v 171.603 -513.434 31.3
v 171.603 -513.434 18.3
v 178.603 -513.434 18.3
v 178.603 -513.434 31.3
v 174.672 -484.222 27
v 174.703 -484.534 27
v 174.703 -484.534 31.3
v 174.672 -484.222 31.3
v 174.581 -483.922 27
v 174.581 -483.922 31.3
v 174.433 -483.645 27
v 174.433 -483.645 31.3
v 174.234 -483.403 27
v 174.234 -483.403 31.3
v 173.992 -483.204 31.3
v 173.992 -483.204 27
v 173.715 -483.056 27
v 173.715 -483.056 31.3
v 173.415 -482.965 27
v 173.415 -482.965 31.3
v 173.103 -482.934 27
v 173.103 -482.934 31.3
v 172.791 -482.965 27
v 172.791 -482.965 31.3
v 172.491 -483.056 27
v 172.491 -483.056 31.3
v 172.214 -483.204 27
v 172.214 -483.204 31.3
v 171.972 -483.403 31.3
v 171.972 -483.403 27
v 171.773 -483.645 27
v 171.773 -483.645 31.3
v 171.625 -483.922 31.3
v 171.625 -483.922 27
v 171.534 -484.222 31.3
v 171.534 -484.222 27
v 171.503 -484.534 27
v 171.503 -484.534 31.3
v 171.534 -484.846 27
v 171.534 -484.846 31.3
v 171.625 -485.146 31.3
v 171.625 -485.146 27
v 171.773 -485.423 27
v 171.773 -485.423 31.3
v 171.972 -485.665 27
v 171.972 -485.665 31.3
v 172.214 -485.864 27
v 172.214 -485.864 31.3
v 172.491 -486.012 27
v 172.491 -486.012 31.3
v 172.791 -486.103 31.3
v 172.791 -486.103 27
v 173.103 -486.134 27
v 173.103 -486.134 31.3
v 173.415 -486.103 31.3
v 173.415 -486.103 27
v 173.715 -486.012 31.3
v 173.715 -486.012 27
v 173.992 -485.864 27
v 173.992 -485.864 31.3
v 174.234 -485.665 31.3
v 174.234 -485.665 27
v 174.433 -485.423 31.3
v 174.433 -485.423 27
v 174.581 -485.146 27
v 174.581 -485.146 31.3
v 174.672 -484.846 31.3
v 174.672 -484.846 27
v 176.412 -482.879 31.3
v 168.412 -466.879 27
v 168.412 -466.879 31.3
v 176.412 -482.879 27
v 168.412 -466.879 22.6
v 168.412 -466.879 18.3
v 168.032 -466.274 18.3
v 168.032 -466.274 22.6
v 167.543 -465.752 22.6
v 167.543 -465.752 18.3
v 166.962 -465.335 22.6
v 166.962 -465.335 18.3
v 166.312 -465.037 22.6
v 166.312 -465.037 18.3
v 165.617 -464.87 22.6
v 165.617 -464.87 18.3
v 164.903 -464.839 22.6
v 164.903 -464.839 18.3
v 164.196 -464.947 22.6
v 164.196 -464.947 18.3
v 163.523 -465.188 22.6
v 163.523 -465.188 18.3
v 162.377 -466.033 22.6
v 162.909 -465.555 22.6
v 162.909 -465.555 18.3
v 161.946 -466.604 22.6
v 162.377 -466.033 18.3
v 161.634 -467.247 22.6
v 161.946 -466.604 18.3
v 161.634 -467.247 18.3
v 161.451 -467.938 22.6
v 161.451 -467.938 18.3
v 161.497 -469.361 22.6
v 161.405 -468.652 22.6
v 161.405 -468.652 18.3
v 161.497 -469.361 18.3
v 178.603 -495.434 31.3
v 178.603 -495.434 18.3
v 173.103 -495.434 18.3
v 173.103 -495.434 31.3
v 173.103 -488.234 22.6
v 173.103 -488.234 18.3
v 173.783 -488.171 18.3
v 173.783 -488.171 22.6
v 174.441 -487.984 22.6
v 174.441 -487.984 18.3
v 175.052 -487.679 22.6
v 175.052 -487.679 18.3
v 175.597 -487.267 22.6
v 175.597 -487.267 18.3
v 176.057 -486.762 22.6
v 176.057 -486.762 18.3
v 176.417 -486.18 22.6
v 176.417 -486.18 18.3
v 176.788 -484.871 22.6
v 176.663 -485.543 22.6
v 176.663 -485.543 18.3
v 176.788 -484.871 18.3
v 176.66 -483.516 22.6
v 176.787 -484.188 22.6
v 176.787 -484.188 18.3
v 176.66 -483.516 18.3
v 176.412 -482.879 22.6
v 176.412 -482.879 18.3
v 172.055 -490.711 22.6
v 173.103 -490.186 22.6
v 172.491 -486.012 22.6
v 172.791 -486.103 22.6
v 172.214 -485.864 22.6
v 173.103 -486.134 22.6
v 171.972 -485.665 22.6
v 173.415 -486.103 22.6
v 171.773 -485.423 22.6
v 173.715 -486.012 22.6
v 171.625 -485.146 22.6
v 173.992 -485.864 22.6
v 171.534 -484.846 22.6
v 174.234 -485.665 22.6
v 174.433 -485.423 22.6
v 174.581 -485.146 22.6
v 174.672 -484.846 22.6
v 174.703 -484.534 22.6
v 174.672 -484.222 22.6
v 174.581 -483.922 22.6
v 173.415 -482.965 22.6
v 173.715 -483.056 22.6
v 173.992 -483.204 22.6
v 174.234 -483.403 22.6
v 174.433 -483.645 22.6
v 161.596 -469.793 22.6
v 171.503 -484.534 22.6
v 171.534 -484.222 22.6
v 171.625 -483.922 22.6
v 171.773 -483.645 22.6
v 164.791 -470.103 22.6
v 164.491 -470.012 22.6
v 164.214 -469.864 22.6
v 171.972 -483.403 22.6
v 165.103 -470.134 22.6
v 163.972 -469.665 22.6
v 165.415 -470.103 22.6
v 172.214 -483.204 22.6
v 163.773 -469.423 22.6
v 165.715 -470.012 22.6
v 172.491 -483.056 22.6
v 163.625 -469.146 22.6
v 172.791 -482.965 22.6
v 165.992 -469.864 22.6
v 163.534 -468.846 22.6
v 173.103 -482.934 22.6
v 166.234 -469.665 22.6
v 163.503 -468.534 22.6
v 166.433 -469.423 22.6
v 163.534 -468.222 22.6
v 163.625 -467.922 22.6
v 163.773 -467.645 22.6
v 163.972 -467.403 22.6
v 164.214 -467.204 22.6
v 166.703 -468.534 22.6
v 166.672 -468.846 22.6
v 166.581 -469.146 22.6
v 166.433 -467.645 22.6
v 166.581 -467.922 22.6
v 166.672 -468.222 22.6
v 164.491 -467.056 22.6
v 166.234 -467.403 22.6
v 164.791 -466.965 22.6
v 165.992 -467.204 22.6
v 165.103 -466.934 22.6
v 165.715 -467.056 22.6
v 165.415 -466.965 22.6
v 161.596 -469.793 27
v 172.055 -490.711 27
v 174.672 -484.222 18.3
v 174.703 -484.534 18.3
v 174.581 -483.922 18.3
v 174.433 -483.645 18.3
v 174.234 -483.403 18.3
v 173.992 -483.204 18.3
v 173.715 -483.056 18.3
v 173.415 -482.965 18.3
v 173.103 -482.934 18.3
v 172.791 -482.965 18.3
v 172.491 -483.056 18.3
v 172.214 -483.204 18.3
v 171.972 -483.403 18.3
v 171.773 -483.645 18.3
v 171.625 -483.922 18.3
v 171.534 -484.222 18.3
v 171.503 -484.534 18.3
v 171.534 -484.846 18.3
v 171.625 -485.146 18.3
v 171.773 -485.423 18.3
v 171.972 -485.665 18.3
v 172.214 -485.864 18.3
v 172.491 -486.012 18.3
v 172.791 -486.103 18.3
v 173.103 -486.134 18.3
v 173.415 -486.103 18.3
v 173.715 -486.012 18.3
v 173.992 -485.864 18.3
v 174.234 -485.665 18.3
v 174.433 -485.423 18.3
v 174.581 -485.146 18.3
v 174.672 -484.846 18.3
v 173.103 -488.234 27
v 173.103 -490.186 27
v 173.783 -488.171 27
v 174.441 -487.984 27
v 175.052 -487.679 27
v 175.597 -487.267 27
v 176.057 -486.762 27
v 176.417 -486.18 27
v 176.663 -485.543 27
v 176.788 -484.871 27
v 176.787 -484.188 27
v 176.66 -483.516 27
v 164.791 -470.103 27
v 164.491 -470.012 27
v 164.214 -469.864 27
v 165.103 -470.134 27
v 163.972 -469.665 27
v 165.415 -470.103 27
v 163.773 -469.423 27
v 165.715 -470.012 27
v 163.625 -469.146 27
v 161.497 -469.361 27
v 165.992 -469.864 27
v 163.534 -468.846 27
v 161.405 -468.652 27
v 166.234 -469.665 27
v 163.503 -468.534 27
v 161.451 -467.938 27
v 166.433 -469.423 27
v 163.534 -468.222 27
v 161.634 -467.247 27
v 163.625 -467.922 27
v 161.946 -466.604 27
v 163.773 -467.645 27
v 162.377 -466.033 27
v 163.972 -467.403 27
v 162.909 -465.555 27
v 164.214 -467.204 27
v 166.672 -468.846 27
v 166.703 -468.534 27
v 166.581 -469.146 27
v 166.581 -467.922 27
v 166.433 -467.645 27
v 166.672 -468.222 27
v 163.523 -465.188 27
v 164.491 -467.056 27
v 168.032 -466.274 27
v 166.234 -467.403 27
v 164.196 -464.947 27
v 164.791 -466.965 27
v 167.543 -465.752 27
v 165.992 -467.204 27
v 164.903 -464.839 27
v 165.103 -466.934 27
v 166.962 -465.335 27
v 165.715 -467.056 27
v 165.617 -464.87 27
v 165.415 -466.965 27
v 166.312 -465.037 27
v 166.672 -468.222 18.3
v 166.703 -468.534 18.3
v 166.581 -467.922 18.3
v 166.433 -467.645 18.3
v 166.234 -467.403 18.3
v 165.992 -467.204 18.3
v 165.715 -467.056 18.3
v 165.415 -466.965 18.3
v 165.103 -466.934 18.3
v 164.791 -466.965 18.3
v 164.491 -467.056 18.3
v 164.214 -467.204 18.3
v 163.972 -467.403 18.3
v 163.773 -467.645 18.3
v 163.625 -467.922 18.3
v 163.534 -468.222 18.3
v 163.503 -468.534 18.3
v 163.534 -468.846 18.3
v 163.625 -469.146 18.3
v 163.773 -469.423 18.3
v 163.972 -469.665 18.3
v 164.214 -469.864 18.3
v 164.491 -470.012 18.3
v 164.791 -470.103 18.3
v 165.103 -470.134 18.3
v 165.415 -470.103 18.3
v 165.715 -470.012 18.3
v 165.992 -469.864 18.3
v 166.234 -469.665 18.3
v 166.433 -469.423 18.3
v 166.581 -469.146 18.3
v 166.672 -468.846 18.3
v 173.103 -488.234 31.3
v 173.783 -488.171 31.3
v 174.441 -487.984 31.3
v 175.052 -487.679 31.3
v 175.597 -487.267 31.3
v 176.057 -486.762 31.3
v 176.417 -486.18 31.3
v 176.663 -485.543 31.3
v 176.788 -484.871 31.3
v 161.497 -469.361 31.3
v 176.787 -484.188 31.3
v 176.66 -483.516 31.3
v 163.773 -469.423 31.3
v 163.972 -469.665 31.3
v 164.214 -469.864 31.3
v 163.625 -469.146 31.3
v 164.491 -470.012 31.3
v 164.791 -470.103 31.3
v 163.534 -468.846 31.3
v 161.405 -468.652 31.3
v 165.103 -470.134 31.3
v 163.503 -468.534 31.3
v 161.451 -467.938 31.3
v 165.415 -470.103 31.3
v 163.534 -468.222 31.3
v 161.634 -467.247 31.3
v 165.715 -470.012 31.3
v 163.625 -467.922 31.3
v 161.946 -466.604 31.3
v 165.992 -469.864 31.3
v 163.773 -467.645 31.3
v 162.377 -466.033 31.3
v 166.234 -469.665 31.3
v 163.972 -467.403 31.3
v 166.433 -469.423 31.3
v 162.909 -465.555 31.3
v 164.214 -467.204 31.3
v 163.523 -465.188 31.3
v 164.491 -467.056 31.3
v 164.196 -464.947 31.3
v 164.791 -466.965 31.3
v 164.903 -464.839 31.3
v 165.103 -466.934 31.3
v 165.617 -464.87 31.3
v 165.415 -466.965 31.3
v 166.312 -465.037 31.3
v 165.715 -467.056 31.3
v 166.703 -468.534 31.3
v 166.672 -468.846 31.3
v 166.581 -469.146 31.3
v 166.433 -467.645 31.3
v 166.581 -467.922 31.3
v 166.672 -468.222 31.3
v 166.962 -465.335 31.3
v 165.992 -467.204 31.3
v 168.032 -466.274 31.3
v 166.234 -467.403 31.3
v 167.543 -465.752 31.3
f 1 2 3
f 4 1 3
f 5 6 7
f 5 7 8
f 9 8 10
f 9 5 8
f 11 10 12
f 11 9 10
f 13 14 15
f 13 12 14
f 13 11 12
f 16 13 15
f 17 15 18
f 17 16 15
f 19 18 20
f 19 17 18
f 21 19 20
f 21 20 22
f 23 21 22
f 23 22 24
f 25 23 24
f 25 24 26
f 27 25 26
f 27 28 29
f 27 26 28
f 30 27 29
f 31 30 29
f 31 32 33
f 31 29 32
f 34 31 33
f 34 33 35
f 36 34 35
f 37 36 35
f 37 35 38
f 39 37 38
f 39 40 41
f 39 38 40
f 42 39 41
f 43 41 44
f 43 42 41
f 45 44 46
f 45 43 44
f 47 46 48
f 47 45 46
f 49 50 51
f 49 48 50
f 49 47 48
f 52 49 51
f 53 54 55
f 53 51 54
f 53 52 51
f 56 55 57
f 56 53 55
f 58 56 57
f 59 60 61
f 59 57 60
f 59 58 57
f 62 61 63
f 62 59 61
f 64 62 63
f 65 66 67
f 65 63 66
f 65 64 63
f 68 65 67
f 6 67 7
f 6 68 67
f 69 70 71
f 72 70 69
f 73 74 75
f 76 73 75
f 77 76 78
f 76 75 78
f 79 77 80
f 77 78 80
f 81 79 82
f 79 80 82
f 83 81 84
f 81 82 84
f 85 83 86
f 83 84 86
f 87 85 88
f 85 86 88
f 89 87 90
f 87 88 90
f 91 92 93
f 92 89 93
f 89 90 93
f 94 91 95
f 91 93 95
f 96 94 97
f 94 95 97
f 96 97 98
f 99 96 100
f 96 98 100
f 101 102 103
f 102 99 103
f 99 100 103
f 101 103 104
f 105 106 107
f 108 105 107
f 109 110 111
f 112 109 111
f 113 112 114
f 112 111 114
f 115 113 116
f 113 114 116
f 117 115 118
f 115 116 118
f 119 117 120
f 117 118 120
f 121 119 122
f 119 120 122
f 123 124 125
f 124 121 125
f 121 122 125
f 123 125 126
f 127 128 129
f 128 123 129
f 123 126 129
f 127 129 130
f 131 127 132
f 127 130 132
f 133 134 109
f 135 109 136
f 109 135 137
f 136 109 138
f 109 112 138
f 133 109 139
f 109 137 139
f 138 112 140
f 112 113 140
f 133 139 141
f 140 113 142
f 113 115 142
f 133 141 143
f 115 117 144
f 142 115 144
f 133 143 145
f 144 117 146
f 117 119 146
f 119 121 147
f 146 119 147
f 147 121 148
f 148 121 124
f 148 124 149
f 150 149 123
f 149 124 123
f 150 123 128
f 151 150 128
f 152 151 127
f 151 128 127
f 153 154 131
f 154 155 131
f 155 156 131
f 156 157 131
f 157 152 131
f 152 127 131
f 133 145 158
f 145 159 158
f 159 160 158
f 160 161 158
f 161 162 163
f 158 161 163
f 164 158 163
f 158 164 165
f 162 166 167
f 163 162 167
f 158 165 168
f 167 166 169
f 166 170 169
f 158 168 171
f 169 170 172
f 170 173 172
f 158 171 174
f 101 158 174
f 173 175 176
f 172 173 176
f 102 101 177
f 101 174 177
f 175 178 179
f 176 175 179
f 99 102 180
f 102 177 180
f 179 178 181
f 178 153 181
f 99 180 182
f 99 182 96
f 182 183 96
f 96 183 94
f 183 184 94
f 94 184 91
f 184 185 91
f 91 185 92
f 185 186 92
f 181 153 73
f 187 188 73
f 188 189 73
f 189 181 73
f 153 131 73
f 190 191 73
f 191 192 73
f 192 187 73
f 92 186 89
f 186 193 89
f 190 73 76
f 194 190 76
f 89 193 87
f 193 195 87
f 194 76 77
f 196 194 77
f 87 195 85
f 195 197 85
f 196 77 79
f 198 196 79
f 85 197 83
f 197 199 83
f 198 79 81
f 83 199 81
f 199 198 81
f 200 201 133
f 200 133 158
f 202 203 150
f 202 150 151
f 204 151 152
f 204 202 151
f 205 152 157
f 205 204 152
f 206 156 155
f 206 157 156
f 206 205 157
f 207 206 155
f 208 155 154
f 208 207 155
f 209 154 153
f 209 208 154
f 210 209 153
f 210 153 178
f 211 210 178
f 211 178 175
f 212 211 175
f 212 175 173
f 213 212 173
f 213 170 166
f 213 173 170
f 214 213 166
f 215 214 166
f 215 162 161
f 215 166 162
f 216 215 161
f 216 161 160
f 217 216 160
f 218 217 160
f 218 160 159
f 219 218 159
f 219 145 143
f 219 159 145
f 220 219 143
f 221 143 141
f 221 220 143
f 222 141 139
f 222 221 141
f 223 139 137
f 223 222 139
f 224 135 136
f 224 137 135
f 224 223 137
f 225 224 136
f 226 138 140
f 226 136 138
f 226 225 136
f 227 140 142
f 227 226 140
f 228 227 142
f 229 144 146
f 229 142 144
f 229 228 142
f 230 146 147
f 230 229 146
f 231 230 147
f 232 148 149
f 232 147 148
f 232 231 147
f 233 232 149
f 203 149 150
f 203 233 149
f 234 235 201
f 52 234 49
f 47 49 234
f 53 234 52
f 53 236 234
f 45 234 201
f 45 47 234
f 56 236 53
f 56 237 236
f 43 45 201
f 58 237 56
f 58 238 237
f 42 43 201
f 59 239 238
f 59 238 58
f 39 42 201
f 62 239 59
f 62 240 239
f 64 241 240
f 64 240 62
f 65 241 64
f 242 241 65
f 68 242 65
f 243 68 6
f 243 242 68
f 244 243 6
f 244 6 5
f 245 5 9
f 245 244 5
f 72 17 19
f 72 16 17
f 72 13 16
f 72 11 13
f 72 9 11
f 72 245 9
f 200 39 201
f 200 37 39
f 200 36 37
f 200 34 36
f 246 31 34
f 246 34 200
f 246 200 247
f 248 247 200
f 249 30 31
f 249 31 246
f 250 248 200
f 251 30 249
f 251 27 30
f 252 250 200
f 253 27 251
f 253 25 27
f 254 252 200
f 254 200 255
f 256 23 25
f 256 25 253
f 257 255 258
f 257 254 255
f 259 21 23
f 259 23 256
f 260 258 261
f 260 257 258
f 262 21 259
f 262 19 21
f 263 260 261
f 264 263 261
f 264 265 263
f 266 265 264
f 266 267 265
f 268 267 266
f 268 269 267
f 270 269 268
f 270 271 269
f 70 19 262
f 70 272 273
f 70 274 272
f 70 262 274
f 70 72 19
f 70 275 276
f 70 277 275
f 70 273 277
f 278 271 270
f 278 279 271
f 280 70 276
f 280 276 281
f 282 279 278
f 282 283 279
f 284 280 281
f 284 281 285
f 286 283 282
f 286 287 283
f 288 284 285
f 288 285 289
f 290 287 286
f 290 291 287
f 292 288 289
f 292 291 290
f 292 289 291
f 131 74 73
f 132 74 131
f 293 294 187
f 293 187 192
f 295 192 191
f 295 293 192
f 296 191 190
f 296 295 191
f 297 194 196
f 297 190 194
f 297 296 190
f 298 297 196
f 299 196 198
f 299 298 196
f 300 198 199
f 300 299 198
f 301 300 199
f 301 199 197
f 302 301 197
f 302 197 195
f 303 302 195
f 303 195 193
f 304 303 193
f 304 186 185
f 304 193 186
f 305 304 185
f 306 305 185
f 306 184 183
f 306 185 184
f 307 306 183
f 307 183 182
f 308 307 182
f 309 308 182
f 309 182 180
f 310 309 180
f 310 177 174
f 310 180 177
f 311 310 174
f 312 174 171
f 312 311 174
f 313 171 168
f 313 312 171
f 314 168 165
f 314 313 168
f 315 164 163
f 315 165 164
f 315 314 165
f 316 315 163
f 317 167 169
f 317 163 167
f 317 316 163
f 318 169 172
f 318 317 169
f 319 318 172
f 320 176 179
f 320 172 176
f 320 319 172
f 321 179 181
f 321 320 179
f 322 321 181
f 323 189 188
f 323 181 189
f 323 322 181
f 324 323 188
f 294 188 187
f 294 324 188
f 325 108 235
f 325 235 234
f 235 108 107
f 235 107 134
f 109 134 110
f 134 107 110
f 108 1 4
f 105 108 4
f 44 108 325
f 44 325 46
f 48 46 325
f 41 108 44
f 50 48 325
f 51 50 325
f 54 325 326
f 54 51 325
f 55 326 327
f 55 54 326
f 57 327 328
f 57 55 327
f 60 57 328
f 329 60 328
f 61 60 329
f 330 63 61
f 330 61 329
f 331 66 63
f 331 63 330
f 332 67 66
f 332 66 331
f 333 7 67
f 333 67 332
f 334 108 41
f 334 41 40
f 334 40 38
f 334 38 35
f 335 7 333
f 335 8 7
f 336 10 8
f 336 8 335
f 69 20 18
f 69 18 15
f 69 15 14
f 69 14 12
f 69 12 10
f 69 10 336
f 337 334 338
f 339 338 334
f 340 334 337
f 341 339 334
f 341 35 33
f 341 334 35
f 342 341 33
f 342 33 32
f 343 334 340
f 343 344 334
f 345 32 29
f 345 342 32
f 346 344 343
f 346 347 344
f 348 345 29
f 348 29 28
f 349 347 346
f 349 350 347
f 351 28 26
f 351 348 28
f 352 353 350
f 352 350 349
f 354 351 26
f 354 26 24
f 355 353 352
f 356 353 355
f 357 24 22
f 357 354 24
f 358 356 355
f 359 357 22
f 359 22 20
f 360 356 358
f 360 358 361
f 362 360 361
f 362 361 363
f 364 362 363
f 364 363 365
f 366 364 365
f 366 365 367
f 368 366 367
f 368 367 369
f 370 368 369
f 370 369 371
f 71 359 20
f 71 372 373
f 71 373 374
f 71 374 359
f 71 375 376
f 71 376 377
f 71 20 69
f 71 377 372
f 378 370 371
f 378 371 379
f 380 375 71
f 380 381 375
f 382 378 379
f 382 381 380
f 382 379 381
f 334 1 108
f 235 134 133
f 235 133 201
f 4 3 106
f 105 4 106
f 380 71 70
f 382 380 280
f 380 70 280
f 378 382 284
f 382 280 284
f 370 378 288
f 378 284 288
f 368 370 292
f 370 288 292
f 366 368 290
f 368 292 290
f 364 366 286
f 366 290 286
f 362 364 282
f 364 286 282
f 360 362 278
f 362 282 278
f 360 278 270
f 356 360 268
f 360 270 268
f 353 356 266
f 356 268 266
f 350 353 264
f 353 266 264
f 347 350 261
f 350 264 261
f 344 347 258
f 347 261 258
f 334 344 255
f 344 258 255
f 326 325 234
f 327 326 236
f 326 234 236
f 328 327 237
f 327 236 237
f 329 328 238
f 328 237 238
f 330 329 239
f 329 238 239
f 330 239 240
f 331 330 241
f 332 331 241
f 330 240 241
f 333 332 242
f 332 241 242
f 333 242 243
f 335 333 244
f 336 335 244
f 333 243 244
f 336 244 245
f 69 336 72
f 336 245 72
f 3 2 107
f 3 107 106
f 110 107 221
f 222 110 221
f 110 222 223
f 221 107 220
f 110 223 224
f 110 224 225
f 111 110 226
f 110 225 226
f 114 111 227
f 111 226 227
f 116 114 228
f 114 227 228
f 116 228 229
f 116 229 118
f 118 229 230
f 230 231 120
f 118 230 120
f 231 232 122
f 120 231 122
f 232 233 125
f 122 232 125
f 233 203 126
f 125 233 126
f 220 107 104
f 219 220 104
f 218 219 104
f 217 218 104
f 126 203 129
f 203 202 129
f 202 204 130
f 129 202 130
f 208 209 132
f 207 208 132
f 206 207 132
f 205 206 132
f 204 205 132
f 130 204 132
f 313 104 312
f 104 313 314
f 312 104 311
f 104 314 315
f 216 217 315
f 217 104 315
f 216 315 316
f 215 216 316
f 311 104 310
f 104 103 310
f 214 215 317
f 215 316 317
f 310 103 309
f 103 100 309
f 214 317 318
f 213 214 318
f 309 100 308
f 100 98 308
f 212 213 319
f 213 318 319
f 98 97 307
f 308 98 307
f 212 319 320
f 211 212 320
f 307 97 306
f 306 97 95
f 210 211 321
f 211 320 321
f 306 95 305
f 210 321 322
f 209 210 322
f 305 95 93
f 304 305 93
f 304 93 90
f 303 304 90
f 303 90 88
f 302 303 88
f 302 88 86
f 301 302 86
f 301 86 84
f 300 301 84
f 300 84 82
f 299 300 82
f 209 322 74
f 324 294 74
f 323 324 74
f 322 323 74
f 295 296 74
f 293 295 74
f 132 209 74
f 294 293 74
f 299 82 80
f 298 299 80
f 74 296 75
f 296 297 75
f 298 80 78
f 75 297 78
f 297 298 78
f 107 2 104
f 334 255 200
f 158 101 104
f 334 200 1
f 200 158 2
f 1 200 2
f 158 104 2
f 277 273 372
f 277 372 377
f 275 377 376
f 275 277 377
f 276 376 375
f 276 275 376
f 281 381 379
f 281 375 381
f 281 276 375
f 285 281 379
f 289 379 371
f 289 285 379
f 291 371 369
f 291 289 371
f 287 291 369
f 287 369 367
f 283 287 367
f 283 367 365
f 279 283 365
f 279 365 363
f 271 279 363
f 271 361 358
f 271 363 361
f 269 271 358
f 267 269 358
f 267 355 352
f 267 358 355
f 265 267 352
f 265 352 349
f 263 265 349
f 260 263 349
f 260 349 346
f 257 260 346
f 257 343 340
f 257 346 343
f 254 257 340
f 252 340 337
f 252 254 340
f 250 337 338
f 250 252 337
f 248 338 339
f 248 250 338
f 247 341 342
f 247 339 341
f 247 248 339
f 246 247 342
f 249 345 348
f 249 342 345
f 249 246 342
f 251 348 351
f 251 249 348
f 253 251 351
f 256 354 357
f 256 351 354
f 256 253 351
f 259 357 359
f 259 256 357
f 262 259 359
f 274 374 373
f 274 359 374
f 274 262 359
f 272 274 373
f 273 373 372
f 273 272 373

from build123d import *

# Parameters (mm, degrees)
CYLINDER005_R     = 1.6
CYLINDER005_DEPTH = 30
PAD001_DEPTH      = 13
SKETCH001_W       = 28
SKETCH001_H       = 4.4
POCKET002_DEPTH   = 7.4


with BuildPart() as finger_drill_master:
    # Cylinder005 → Cylinder005 (new body)
    with BuildSketch(Plane.XY.offset(-8)):
        Circle(CYLINDER005_R)
    extrude(amount=CYLINDER005_DEPTH)


with BuildPart() as clone001:
    # Clone001 base: copy of finger-drill-master
    add(finger_drill_master.part)


with BuildPart() as clone001_1:
    # Clone001 placement: moved
    add(clone001.part.moved(Location((-5.5, 28.9, 0))))


with BuildPart() as finger_drills:
    # Clone002 base: copy of finger-drill-master
    add(finger_drill_master.part)


with BuildPart() as finger_drills_1:
    # Clone002 placement: moved
    add(finger_drills.part.moved(Location((-13.5, 44.9, 0))))

    # Fusion011: union Clone001
    add(clone001_1.part)


with BuildPart() as clone_of_left_finger:
    # Sketch007 → Pad001 (new body)
    with BuildSketch(Plane.XY):
        with BuildLine():
            Line((0, 0), (0, 18))
            Line((0, 18), (-5.5, 18))
            Line((-5.5, 18), (-5.5, 25.2))
            ThreePointArc((-5.5, 25.2), (-2.3525883805, 26.9548007564), (-2.1906255667, 30.55470265))
            Line((-10.1906192745, 46.5546900658), (-2.1906255667, 30.55470265))
            ThreePointArc((-10.1906192745, 46.5546900658), (-14.7496924515, 48.3825664066), (-17.1063967324, 44.0730159565))
            Line((-17.1063967324, 44.0730159565), (-7, 0))
            Line((-7, 0), (0, 0))
        make_face()
    extrude(amount=PAD001_DEPTH)

    # Sketch001 → Pocket002 (cut)
    with BuildSketch(Plane(origin=(10.4693806066, 5.2346903033, 0), x_dir=(-0.4472135955, 0.894427191, 0), z_dir=(0.894427191, 0.4472135955, 0))):
        with Locations((37.2528992744, 6.5)):
            Rectangle(SKETCH001_W, SKETCH001_H)
    extrude(amount=-POCKET002_DEPTH, mode=Mode.SUBTRACT)

    # Cut012: cut finger-drills
    add(finger_drills_1.part, mode=Mode.SUBTRACT)


with BuildPart() as clone_of_left_finger_1:
    # Cut012 placement: moved
    add(clone_of_left_finger.part.moved(Location((0, -57, 0))))


with BuildPart() as clone_of_left_finger_2:
    # Clone003 placement: moved
    add(clone_of_left_finger_1.part.moved(Location((192.6034801236, 242.5662976869, 0))))


with BuildPart() as clone_of_left_finger_3:
    # Clone180 placement: moved
    add(clone_of_left_finger_2.part.moved(Location((-14.0004801236, -699.0002976869, 18.3))))


solid = clone_of_left_finger_3.part
